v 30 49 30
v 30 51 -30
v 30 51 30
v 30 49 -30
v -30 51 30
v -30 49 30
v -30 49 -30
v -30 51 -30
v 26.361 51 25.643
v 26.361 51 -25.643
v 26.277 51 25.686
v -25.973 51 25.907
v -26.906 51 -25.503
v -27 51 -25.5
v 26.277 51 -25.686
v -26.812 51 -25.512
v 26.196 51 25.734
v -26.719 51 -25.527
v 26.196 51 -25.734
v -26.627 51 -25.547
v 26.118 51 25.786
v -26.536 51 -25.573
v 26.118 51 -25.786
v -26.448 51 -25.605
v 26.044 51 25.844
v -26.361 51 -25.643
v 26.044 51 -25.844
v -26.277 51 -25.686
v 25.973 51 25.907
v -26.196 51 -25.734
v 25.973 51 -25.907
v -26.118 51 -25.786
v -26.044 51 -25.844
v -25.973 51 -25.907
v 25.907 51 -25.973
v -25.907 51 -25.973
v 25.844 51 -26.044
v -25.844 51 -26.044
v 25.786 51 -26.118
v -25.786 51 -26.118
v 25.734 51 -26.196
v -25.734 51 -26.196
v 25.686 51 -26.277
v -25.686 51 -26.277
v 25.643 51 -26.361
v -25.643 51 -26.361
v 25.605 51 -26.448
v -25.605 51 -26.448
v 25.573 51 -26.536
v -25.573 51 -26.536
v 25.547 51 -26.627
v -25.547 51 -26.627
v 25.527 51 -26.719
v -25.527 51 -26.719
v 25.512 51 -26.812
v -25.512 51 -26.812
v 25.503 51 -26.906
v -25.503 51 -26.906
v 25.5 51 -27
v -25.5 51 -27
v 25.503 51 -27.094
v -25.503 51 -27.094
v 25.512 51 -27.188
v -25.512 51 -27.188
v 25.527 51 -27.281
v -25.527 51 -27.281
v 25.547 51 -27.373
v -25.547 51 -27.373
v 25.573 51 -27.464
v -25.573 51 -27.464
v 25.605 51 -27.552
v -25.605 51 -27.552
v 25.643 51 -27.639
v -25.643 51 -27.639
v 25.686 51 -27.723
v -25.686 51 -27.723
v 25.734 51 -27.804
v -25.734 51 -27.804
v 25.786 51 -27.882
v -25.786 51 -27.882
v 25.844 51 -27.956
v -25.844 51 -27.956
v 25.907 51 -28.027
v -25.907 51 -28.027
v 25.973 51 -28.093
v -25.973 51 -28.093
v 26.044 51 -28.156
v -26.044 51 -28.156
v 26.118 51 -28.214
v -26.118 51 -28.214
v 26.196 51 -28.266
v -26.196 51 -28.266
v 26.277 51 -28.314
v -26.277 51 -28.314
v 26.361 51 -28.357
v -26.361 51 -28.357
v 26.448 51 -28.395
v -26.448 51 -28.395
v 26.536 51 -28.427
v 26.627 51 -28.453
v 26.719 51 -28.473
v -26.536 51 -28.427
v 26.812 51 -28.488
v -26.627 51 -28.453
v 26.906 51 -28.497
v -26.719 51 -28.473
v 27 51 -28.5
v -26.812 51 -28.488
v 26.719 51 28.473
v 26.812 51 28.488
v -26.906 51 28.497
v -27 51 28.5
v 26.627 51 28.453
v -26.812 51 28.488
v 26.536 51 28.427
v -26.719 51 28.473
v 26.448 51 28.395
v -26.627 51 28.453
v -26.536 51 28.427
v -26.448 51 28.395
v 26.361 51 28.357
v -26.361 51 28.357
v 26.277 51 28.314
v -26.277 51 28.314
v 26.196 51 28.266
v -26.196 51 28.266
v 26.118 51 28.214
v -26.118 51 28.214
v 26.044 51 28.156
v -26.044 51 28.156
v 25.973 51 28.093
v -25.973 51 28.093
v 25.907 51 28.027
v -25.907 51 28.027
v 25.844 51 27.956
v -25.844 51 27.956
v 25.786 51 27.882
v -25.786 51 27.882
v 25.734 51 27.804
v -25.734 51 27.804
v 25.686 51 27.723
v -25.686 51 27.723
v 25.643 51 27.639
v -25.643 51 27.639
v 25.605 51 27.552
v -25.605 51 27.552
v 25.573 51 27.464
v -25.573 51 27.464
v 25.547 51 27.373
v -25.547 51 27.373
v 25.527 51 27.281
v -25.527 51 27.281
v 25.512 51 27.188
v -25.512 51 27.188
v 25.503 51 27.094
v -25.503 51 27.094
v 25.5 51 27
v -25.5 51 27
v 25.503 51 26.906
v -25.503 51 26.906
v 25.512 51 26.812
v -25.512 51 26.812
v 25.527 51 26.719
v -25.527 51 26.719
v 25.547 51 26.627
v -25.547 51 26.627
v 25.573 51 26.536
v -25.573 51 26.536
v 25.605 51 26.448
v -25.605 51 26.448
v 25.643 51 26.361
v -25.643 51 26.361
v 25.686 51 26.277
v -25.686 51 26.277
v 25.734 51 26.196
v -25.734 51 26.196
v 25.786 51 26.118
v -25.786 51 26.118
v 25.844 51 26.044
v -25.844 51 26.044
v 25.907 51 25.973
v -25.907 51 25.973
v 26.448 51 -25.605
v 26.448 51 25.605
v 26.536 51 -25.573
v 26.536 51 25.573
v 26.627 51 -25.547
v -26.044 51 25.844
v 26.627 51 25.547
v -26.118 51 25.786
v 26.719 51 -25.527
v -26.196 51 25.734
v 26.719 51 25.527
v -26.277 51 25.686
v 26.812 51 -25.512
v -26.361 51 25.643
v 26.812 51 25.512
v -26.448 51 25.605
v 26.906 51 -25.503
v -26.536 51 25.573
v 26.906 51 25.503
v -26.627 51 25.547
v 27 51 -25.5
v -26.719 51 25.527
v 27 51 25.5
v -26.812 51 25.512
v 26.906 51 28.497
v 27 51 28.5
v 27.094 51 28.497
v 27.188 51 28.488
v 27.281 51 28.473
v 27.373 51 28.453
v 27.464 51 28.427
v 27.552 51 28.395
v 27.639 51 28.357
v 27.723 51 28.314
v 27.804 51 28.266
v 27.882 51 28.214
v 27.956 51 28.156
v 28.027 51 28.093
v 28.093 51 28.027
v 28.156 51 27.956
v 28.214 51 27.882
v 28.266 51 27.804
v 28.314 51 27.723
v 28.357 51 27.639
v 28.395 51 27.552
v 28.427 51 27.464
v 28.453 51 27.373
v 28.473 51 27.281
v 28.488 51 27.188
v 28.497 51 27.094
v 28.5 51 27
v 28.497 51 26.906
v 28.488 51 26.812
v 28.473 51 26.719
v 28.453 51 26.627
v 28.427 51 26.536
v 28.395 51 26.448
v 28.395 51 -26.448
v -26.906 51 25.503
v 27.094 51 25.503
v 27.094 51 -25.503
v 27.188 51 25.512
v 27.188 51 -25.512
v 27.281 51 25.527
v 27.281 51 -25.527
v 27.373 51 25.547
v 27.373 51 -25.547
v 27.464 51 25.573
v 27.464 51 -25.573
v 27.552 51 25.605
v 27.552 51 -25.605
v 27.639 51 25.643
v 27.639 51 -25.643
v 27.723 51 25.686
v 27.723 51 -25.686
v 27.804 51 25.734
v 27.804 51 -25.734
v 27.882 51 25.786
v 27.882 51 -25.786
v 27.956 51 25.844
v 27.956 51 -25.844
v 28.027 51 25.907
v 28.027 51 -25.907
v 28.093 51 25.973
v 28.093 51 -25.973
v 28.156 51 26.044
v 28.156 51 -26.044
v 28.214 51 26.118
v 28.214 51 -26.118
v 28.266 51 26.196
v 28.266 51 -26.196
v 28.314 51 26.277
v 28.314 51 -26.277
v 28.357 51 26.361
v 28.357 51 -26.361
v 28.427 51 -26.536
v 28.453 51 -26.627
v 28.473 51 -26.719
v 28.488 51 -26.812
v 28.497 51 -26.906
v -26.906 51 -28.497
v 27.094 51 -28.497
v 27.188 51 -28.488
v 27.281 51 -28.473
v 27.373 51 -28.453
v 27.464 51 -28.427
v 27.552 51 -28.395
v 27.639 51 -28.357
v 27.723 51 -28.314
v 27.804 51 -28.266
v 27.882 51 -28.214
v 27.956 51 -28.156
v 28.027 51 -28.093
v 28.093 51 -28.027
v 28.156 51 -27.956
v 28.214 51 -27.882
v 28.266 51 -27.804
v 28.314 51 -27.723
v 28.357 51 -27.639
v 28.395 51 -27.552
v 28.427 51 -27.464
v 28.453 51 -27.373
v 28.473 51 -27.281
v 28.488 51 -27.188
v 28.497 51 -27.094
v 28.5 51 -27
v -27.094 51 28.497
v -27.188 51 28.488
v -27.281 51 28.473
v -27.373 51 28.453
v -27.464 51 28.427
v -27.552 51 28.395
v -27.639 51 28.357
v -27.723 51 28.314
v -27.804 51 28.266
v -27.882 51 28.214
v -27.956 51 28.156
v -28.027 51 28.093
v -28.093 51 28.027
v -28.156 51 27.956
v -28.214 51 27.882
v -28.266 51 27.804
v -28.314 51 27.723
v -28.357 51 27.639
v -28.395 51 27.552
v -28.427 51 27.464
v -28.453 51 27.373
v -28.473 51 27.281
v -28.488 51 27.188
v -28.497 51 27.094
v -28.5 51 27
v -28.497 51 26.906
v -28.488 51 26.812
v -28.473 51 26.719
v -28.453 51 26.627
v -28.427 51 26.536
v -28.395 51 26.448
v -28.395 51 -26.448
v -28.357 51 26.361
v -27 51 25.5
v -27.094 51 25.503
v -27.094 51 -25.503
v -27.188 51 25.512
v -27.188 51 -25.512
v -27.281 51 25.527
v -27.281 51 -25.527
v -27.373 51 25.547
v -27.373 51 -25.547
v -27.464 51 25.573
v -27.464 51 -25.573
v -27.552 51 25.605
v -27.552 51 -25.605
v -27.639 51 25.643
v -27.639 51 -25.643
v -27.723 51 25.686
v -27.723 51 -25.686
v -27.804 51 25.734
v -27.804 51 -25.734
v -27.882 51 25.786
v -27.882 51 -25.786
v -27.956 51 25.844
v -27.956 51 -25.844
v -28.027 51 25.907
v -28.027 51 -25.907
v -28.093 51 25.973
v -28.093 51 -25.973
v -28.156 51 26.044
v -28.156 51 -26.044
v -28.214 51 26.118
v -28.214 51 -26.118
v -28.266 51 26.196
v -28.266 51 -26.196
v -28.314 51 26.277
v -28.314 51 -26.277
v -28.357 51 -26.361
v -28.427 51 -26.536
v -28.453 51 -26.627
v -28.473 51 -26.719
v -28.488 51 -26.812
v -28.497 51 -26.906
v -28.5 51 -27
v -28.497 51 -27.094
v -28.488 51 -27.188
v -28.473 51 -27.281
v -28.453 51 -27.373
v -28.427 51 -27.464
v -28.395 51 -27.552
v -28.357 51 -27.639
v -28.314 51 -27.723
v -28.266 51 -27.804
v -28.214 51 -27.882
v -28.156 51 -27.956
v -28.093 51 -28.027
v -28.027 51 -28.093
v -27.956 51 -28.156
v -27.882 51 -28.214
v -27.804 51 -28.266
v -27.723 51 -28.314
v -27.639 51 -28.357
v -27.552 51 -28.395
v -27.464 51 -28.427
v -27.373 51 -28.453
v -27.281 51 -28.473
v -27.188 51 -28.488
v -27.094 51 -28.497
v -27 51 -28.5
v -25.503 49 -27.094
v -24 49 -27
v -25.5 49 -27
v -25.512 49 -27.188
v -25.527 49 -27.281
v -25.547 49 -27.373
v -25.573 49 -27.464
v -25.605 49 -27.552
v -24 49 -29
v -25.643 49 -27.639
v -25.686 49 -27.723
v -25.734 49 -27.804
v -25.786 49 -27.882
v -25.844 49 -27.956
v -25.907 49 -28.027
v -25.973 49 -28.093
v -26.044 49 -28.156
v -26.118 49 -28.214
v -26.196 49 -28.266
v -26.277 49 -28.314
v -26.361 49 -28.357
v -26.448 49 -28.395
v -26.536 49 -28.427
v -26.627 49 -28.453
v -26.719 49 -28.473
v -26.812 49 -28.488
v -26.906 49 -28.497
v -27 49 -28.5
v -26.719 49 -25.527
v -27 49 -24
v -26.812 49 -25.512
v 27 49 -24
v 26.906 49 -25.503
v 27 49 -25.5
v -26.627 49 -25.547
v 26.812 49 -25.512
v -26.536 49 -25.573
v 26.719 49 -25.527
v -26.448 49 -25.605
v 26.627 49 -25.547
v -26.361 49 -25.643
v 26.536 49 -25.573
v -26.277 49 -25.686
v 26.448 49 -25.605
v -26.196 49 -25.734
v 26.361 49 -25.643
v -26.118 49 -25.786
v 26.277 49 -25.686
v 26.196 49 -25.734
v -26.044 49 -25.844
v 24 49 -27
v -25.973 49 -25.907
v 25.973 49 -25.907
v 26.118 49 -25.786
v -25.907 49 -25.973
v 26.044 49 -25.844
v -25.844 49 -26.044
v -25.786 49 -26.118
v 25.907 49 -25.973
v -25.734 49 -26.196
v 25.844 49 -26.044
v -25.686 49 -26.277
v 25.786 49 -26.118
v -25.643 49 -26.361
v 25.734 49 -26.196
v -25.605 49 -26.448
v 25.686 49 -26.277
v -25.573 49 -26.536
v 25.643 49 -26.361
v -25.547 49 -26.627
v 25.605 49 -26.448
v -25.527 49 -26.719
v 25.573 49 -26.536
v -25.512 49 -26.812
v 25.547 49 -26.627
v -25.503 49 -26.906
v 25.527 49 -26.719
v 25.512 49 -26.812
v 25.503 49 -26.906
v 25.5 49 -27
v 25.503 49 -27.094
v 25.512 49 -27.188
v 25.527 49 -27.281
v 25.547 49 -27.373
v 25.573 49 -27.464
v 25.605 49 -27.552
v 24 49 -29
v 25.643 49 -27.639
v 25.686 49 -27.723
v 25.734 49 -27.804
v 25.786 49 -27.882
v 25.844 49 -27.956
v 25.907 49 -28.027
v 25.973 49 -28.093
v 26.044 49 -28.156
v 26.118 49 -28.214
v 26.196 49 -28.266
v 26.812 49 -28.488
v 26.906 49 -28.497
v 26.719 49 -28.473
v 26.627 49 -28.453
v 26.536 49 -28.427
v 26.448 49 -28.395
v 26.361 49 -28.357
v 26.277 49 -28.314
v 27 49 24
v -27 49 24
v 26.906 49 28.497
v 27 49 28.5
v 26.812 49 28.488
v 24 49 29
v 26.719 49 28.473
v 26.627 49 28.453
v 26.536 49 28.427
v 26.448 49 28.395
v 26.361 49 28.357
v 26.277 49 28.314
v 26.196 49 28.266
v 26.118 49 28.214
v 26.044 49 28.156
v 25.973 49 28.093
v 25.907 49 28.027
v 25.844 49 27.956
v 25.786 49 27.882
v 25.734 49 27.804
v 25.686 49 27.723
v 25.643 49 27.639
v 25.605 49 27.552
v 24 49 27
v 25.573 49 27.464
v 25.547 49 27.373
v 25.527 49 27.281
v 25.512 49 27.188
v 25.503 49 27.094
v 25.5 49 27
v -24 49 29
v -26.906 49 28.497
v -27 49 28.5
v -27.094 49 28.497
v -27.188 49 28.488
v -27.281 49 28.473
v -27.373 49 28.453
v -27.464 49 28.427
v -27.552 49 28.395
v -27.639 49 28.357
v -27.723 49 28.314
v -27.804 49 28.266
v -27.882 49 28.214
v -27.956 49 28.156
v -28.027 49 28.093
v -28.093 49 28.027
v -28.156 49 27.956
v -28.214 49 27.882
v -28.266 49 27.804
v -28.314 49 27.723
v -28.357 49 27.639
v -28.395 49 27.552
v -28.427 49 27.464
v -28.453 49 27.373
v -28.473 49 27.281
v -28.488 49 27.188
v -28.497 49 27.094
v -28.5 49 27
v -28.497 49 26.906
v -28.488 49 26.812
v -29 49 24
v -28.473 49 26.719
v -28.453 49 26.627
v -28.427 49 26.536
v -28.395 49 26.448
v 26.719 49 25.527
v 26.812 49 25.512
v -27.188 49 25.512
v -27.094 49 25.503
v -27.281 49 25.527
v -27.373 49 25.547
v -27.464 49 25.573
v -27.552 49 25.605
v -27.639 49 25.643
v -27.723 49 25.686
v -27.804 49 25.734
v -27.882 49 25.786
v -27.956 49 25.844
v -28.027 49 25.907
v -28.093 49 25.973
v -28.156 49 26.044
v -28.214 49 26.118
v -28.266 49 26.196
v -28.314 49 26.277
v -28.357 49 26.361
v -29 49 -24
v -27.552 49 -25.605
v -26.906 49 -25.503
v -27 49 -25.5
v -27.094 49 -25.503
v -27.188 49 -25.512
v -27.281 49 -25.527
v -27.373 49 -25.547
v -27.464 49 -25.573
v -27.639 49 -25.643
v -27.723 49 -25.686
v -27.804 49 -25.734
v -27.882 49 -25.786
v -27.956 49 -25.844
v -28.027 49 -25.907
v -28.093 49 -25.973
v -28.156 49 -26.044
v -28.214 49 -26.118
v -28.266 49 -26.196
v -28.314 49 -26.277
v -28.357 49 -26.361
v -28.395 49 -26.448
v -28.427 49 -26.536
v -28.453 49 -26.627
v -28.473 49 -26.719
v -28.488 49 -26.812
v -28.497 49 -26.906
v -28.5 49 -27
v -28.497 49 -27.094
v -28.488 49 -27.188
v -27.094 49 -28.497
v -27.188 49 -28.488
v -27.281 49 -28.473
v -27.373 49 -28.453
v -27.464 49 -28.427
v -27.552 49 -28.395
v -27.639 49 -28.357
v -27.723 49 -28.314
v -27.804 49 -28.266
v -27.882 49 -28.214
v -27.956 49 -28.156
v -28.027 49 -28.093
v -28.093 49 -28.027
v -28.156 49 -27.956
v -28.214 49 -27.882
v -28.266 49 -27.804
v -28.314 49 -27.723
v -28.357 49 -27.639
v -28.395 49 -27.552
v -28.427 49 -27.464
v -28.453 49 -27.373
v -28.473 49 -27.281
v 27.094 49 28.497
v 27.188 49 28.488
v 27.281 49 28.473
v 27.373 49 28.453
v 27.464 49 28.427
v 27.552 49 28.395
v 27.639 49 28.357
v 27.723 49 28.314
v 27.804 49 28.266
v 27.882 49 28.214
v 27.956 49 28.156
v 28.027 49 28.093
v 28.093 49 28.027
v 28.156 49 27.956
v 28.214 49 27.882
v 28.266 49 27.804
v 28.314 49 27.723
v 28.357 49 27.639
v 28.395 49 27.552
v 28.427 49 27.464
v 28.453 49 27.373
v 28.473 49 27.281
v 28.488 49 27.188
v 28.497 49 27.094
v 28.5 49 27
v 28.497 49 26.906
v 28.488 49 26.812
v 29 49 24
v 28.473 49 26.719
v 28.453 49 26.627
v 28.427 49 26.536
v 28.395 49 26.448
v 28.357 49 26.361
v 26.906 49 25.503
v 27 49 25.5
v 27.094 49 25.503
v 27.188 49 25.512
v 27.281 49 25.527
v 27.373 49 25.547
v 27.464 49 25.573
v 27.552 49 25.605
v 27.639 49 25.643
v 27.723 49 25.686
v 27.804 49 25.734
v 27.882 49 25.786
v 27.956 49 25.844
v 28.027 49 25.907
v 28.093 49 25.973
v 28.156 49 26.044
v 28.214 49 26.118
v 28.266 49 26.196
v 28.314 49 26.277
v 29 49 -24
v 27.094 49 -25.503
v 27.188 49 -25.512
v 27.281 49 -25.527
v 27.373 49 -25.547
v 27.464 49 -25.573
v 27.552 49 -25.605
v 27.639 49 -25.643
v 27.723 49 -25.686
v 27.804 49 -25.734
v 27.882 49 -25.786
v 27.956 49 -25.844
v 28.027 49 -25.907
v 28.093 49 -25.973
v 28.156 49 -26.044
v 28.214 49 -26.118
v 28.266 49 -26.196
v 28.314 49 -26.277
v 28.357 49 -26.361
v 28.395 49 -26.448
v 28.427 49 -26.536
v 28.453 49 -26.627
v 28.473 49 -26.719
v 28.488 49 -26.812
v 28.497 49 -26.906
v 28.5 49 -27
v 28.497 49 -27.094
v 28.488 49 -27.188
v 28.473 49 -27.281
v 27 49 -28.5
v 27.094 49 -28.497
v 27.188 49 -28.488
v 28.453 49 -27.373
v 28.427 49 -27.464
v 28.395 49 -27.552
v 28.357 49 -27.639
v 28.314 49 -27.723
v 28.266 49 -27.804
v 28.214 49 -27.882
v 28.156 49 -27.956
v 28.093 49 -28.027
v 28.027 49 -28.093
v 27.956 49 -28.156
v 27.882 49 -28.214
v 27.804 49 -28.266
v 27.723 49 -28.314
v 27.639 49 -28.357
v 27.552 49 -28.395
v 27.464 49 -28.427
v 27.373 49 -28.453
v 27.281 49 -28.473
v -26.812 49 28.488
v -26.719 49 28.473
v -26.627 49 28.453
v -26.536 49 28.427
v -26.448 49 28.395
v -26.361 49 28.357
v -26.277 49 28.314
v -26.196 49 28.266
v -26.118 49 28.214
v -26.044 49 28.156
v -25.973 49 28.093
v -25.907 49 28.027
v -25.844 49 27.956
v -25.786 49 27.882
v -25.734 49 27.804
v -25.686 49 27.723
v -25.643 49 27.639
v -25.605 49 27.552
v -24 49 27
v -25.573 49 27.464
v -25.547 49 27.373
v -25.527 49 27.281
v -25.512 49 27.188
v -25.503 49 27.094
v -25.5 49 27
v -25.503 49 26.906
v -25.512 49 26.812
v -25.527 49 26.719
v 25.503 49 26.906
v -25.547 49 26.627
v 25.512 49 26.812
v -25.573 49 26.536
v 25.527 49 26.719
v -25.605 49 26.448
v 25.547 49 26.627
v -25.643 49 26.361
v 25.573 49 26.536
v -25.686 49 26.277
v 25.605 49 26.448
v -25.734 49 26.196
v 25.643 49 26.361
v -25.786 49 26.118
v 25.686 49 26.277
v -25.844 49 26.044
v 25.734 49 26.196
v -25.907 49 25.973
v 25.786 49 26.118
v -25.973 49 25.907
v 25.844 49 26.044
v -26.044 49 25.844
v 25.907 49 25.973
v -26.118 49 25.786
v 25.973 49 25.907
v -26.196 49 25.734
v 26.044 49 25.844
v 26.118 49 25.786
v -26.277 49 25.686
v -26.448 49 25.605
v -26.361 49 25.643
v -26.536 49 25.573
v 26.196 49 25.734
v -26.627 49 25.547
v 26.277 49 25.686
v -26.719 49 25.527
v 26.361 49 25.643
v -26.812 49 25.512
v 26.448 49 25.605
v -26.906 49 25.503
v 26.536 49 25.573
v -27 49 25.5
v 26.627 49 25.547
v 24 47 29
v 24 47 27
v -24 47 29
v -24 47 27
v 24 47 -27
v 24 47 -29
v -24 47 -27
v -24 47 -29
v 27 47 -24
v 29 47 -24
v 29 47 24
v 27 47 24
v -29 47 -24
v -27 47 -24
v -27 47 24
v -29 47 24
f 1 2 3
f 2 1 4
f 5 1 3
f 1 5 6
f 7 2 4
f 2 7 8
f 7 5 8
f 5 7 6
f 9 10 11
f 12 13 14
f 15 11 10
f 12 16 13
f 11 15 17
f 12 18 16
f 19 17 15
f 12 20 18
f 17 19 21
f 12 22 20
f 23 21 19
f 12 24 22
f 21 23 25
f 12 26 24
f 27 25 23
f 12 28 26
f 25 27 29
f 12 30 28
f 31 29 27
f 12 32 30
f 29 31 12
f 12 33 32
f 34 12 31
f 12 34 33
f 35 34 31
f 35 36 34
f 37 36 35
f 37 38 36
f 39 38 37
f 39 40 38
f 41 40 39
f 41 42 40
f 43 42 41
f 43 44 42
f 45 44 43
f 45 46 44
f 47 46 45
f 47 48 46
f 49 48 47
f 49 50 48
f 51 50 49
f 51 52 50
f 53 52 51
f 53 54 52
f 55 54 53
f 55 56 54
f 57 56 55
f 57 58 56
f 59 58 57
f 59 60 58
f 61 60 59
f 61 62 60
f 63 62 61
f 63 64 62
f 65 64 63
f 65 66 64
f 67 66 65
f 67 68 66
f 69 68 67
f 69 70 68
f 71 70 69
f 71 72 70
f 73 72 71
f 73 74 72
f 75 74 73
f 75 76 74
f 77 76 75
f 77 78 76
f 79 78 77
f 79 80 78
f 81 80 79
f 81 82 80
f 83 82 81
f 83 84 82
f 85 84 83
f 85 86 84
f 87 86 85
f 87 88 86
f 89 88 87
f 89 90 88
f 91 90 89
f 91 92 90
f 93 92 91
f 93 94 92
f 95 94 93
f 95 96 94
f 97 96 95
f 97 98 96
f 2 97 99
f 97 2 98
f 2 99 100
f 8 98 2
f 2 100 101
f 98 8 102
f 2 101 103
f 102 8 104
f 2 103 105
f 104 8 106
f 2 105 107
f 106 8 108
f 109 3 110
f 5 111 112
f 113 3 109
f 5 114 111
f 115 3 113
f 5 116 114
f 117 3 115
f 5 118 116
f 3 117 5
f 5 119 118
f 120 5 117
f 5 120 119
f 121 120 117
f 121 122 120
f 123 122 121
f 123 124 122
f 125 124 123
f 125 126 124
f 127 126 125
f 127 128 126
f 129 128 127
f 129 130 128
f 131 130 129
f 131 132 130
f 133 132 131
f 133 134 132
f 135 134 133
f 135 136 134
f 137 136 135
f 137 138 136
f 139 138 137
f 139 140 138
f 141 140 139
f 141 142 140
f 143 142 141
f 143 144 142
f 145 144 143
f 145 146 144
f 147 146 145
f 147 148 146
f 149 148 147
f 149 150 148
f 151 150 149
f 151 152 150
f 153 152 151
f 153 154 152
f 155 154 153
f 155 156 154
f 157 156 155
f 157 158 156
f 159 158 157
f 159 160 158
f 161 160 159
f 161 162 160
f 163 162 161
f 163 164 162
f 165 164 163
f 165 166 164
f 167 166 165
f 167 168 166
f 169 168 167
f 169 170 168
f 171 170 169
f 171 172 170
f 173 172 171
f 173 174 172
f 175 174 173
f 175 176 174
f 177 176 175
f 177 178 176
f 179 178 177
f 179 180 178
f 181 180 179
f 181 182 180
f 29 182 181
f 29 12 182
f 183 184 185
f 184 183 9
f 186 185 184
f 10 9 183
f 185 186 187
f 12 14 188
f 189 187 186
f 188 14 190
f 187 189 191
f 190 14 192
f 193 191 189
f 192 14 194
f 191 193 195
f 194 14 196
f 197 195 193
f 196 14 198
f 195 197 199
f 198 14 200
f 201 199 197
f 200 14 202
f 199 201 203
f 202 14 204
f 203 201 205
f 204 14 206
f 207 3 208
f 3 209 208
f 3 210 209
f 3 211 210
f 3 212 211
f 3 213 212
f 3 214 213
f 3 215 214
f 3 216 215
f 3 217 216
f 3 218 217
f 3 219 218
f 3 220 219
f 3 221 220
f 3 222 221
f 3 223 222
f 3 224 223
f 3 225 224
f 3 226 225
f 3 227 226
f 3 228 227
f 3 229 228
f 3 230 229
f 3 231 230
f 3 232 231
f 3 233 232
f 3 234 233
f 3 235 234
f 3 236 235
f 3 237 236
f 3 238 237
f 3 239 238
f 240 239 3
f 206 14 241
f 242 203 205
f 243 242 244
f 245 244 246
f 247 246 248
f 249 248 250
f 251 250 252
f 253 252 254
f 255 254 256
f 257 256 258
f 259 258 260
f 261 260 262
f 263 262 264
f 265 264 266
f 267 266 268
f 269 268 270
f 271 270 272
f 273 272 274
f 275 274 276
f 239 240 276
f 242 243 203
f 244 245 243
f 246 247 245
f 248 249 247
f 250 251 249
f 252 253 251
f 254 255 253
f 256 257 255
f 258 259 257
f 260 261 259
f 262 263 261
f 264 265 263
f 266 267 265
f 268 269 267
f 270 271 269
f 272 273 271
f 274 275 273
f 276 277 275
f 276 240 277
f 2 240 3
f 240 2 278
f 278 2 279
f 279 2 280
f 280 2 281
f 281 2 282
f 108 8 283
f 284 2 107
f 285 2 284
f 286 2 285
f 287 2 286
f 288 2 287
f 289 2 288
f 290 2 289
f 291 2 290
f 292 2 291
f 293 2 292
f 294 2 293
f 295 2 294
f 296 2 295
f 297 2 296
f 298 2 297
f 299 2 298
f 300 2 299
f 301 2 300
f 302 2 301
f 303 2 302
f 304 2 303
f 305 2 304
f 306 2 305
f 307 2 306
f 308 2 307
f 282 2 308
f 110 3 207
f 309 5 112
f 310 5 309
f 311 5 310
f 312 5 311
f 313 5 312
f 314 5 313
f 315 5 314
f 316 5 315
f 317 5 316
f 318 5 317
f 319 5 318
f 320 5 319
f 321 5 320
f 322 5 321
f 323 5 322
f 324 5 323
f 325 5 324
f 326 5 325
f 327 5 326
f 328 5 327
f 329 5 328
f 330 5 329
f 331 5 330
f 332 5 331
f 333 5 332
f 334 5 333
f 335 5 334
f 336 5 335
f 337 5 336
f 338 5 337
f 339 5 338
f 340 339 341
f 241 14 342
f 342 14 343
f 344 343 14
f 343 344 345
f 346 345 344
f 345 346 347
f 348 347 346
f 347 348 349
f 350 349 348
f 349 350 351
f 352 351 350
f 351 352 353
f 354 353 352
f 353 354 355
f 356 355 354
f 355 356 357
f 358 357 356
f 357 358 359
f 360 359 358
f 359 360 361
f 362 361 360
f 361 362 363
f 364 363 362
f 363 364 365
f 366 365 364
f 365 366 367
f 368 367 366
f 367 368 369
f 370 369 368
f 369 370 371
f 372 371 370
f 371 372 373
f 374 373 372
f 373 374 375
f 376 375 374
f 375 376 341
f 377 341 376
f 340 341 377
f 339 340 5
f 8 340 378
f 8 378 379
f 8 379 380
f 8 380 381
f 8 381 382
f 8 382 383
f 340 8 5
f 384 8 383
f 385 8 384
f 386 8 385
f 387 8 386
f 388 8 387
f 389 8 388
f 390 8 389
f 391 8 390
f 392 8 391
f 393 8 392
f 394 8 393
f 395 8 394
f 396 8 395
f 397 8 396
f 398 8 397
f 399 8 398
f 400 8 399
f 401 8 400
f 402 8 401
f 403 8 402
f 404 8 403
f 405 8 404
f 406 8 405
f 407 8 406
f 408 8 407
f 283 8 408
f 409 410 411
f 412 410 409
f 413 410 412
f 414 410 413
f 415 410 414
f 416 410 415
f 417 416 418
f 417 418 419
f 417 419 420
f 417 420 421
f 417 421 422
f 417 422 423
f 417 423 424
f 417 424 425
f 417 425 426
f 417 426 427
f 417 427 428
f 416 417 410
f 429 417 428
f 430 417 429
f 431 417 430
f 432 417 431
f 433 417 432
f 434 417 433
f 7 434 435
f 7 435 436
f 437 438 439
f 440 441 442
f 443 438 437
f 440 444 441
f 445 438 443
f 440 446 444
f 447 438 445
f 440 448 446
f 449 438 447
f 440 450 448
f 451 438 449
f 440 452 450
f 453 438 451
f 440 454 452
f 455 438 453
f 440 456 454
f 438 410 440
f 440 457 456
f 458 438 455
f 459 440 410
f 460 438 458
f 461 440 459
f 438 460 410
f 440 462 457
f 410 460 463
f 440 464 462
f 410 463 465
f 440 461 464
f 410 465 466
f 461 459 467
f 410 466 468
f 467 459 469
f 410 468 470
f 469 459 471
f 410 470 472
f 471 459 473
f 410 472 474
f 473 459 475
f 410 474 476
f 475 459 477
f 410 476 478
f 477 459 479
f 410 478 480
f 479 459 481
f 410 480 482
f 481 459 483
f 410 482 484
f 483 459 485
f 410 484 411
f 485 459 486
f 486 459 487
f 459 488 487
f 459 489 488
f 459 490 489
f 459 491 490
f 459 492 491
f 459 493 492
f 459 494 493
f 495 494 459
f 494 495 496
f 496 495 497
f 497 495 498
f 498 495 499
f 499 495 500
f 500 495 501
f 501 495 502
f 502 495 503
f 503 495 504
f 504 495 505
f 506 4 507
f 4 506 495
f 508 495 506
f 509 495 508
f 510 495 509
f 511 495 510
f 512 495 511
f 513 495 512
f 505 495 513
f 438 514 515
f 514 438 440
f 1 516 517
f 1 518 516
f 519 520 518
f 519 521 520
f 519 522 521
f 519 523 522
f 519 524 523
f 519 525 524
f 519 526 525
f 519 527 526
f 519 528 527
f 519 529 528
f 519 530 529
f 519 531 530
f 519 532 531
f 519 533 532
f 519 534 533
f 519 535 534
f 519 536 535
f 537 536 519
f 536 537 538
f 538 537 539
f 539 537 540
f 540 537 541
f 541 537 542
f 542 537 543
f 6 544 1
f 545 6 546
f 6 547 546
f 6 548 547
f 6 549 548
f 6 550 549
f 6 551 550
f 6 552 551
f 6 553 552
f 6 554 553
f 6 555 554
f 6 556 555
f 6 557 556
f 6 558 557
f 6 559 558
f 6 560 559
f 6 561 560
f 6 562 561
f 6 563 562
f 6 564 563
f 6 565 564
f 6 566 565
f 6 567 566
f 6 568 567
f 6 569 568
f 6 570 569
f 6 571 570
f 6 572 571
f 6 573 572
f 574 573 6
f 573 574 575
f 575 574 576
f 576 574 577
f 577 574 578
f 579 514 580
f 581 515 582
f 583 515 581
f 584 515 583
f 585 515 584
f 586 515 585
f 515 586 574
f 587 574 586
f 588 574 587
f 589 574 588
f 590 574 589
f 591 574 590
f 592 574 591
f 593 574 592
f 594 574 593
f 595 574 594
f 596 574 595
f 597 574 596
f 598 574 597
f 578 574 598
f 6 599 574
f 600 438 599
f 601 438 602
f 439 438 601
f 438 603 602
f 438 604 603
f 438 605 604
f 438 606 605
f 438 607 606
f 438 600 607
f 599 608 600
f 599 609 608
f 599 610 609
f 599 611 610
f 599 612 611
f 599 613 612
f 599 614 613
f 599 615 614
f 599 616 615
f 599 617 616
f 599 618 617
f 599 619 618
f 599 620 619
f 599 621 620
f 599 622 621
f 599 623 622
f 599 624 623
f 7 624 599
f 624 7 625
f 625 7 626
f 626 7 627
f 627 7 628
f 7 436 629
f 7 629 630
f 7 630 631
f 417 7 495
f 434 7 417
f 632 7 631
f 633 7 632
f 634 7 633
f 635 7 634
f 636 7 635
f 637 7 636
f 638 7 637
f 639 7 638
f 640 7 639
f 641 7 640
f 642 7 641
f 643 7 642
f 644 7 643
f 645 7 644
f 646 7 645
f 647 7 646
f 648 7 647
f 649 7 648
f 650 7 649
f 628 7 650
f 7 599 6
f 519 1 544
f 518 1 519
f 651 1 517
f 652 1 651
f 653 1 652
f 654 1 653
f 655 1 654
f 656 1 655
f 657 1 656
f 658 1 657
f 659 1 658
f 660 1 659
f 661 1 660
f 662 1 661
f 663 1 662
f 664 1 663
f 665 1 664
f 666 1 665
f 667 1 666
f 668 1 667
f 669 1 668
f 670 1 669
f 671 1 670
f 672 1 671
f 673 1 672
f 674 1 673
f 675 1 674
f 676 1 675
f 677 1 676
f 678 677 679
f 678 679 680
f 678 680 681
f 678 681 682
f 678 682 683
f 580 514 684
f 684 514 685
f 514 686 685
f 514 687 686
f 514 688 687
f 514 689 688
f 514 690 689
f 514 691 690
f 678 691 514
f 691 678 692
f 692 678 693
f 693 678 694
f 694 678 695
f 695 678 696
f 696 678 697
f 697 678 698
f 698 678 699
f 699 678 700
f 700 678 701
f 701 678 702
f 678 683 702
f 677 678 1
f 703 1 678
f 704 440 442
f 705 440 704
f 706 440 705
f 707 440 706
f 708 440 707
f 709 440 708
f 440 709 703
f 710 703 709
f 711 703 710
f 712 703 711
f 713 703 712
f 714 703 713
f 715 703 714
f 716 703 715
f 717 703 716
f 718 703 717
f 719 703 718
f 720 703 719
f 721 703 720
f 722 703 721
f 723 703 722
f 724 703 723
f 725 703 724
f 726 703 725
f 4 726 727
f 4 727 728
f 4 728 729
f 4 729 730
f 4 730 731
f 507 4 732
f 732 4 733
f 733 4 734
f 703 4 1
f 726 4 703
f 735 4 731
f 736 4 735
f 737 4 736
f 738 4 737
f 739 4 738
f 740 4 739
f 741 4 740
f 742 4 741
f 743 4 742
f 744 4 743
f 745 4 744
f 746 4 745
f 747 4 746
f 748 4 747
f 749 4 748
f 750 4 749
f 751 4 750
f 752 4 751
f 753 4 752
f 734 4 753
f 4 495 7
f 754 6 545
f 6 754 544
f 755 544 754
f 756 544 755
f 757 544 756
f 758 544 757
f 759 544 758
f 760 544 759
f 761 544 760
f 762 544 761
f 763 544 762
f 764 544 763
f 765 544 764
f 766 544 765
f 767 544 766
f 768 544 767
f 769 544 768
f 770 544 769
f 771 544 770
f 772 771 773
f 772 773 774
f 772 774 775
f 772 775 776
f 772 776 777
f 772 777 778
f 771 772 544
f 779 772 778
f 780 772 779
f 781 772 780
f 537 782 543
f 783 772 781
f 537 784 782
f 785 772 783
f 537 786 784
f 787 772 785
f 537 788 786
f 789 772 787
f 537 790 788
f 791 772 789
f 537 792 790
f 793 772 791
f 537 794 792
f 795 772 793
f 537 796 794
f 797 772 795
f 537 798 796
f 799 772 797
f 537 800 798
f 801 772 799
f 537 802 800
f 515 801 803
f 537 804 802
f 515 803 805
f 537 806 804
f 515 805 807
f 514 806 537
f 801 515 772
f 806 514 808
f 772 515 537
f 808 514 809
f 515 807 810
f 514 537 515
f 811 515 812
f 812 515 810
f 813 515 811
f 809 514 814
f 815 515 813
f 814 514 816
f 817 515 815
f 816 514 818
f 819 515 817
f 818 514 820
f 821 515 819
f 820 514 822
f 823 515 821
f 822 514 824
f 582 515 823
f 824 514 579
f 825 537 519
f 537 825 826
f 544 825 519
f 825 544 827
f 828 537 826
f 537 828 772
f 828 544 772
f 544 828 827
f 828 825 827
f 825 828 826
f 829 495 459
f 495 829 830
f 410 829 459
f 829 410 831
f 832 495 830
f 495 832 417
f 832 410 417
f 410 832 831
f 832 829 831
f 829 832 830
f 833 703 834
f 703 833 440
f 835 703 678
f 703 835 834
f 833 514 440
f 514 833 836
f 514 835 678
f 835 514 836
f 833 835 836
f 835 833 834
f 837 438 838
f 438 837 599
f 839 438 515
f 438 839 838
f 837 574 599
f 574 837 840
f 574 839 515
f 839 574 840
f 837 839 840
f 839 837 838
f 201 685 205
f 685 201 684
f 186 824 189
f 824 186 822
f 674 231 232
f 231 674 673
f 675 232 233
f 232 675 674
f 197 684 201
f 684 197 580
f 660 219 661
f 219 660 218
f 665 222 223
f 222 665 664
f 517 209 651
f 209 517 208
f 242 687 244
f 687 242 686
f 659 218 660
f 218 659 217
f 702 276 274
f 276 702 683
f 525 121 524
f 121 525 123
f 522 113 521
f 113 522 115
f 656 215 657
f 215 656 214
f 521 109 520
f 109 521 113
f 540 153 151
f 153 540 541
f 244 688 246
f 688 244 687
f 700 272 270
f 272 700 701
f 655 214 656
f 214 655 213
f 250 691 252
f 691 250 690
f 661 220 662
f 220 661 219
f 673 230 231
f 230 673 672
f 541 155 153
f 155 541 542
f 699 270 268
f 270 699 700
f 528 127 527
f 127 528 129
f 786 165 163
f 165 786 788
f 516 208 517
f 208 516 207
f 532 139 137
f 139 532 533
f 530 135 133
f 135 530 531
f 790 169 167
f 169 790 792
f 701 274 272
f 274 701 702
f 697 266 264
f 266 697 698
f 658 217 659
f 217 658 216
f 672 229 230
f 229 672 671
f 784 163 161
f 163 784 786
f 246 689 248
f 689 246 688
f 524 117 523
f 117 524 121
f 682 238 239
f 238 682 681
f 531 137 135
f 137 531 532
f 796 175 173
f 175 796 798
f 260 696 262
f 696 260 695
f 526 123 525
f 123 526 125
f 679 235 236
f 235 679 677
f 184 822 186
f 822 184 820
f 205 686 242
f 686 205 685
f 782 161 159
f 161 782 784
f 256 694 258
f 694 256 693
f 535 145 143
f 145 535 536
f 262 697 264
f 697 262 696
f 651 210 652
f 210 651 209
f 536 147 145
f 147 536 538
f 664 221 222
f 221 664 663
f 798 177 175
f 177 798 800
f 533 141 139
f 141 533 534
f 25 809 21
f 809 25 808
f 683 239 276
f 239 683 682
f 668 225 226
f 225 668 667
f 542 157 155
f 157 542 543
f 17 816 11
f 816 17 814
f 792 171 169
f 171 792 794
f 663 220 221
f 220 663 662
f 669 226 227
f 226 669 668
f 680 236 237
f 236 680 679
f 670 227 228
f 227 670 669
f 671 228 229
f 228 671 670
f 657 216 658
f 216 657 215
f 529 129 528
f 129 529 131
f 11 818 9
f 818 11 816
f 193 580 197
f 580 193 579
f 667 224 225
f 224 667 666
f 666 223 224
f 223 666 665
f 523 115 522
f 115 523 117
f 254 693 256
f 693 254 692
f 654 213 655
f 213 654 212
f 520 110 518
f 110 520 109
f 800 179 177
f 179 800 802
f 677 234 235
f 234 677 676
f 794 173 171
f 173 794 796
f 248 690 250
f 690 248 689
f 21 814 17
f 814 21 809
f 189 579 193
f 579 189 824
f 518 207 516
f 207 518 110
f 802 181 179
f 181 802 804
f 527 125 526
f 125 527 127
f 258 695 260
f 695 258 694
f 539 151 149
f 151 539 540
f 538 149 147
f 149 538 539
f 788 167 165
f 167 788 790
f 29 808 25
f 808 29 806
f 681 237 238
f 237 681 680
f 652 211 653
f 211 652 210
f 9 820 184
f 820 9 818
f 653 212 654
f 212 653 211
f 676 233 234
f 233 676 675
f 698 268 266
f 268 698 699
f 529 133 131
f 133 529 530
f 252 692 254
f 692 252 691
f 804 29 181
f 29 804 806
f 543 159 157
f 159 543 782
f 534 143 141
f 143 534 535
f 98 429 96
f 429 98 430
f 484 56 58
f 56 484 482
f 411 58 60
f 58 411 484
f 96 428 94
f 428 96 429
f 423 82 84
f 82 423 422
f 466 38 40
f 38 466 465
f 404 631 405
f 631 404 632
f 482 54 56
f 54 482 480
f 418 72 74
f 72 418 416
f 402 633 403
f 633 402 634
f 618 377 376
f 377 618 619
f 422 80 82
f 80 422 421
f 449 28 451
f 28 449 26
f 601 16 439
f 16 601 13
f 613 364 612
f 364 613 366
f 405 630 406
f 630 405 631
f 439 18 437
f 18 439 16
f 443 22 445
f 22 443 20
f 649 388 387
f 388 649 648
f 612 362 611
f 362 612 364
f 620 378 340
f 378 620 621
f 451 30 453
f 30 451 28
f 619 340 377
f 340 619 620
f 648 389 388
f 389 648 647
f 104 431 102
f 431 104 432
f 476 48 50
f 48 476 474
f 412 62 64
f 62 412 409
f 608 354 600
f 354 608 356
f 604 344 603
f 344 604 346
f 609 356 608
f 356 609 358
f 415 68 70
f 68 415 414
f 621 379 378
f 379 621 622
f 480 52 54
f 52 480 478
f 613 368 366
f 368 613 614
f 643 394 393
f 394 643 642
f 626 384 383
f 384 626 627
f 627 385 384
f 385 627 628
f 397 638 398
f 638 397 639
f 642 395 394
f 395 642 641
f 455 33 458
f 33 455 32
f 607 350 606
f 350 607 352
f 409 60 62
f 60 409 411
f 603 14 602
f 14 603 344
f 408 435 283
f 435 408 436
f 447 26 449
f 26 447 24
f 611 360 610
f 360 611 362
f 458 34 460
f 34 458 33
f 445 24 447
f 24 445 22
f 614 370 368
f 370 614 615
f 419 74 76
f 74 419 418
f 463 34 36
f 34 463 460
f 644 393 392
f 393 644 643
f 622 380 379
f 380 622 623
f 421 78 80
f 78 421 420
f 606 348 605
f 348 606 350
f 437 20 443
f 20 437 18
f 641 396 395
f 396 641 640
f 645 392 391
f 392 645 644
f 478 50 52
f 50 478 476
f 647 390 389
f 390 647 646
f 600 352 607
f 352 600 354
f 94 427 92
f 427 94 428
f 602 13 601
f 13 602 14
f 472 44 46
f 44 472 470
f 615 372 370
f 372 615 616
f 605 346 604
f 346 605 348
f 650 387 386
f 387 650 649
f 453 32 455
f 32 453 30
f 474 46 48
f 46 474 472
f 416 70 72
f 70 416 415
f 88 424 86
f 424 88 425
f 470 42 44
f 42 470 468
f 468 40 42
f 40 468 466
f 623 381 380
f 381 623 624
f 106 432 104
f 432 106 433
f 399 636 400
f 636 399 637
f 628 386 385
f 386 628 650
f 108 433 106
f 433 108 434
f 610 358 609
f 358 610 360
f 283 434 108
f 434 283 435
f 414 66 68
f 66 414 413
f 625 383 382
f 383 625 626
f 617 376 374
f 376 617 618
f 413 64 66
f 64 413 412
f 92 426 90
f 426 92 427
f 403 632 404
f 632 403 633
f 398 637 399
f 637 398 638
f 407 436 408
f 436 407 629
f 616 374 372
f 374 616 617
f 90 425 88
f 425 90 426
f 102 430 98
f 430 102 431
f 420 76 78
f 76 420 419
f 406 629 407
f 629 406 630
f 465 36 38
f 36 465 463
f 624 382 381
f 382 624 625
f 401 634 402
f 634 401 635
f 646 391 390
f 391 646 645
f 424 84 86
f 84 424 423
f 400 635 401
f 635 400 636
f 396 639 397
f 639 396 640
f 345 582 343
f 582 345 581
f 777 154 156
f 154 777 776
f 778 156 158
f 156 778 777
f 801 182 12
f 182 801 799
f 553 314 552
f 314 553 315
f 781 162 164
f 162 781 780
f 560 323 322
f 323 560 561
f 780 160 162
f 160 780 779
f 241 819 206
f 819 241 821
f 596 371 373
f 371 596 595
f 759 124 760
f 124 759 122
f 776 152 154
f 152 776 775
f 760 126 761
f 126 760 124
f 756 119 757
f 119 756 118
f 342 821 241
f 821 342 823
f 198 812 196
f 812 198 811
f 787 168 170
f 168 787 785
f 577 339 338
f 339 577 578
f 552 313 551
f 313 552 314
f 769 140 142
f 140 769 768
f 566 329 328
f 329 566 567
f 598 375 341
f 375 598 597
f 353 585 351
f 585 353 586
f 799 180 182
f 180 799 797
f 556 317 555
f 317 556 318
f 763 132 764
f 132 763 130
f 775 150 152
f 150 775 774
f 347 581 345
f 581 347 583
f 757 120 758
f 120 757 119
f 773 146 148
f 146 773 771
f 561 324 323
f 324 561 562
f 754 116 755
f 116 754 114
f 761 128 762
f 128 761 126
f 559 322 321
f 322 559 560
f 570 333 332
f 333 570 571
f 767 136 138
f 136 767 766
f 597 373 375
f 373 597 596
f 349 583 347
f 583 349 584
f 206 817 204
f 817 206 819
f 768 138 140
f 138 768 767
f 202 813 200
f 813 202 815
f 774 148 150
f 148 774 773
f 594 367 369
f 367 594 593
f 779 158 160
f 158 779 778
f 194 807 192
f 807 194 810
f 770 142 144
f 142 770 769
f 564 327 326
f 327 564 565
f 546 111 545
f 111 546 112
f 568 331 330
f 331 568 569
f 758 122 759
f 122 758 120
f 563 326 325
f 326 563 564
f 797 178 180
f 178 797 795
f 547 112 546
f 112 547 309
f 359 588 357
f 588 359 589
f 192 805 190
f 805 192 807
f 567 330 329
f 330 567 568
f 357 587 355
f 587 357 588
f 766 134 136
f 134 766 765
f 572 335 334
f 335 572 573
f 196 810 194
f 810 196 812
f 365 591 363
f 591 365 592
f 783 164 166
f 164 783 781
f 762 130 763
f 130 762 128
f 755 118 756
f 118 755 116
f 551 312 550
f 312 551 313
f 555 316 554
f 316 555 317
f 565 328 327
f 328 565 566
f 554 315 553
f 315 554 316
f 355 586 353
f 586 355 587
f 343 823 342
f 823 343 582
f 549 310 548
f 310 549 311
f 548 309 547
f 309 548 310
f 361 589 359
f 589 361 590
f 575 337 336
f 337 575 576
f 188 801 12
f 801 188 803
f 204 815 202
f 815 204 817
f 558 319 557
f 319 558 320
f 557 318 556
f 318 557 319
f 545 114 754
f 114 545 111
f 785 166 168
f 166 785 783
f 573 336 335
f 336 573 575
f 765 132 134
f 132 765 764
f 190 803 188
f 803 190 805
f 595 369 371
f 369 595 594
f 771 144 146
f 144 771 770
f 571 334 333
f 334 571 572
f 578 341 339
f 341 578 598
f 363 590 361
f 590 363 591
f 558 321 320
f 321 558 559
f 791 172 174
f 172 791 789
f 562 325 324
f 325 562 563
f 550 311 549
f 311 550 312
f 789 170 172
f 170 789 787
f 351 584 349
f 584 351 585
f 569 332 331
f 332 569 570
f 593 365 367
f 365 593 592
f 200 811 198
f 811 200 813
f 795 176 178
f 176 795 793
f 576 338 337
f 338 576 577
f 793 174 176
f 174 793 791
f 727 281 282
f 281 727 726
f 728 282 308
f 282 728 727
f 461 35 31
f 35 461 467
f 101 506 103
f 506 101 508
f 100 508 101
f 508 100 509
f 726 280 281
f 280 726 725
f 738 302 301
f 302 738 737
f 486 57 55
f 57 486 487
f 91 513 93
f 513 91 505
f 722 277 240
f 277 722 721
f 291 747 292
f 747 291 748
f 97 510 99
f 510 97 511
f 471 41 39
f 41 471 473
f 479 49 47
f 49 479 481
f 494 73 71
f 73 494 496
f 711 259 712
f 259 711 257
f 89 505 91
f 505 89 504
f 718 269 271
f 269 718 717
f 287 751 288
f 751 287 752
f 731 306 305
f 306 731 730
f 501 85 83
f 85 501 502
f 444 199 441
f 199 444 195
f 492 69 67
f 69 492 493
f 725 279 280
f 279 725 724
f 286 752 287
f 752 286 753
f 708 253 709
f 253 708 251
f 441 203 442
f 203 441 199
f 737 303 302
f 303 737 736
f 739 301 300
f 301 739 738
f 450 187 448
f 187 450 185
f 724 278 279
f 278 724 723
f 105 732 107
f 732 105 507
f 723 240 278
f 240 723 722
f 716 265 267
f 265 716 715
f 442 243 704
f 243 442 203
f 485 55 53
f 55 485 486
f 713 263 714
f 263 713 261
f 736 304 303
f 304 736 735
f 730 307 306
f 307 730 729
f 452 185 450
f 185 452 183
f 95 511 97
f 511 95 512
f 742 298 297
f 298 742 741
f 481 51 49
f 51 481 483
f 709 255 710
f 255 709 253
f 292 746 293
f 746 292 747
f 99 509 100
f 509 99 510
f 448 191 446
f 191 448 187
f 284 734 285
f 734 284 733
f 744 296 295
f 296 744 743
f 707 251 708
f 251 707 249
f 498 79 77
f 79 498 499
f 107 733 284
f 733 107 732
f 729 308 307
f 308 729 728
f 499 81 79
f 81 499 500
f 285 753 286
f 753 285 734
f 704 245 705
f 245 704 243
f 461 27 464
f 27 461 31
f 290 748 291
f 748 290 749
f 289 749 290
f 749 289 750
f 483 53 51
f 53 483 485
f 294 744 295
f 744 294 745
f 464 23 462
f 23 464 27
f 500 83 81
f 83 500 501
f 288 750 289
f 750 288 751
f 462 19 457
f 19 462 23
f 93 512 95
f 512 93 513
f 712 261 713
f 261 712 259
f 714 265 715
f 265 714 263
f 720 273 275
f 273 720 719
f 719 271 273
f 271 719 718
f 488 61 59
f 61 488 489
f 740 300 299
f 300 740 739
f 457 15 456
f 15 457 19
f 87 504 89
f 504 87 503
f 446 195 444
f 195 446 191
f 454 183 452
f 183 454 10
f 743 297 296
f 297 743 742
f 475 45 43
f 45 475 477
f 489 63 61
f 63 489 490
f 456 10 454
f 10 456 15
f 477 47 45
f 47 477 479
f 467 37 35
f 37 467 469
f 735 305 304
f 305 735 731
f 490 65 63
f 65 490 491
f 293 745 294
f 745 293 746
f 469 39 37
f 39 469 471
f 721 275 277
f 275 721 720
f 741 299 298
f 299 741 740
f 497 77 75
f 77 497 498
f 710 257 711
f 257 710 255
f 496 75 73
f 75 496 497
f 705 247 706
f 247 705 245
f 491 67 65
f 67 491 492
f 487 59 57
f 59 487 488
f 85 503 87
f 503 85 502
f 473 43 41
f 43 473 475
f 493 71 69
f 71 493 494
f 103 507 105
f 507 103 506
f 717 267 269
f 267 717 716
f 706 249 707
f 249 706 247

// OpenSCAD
$fn=100;

case=false;
back=true;


width=60;
height=60;
depth=50;

wall=2;

// display
display_width=34;
display_height=20;
display_x=5;
display_y=-30;
display_z=-12;

// sensor
sensor_width=33;
sensor_height=22;
sensor_x=0;
sensor_y=-30;
sensor_z=12;

// usb connector
usb_width=10;
usb_height=12;
usb_x=-33;
usb_y=-21;
usb_z=-10;

// LED
led_diameter=5;
led_x=0;
led_y=0;
led_z=height/2-wall/2;

if (case) {
  difference() {
    union() {
      difference() { // case
        cube([width,depth,height], center=true);  // body
        translate ([0,wall/2,0]) cube([width-wall,depth,height-wall], center=true); // inner space
        translate([display_x,display_y+wall,display_z]) cube([display_width, 10, display_height], center=true); // display
        translate([sensor_x,sensor_y+wall,sensor_z]) cube([sensor_width, 10, sensor_height], center=true); // sensor
        translate([usb_x,usb_y,usb_z]) rotate([90,0,0]) cube([usb_width, usb_height, 10], center=true); // usb connector
        translate([led_x,led_y,led_z]) cylinder(d=led_diameter, h=wall*2, center=true); // led
      }
      translate([(width/2-wall*1.5), 0, (height/2-wall*1.5)], center=true) corner();
      translate([-(width/2-wall*1.5), 0, -(height/2-wall*1.5)], center=true) corner();
      translate([-(width/2-wall*1.5), 0, height/2-wall*1.5], center=true) corner();
      translate([width/2-wall*1.5, 0, -(height/2-wall*1.5)], center=true) corner();
    }
    //translate([0,30,0]) cube([100,100,100], center=true); // block for print debugging
  }
}

module corner() { // corner blocks for screws
  width=4;
  hole=2;
  difference() {
    translate([0,0,0]) cube([width, depth, width], center=true);
    translate([0,1,0]) rotate([90,0,0]) cylinder(d=hole, h=depth, center=true);
  }
}

if (back) {
  difference() {
    hole=3;
    translate([0,depth,0]) union() {
      cube([width,wall,height], center=true); // back plate
      translate([0,-wall,height/2-wall]) cube([width-12,wall,wall], center=true); // top
      translate([0,-wall,-(height/2-wall)]) cube([width-12,wall,wall], center=true); // bottom
      translate([width/2-wall,-wall,0]) rotate ([0,90,0]) cube([width-12,wall,wall], center=true); // left
      translate([-(width/2-wall),-wall,0]) rotate ([0,90,0])  cube([width-12,wall,wall], center=true); // right   
    };
    translate([width/2-wall*1.5,depth,height/2-wall*1.5]) rotate ([90,0,0]) cylinder(d=hole,h=10, center=true);
    translate([-(width/2-wall*1.5),depth,-(height/2-wall*1.5)]) rotate ([90,0,0]) cylinder(d=hole,h=10, center=true);
    translate([-(width/2-wall*1.5),depth,height/2-wall*1.5]) rotate ([90,0,0]) cylinder(d=hole,h=10, center=true);
    translate([width/2-wall*1.5,depth,-(height/2-wall*1.5)]) rotate ([90,0,0]) cylinder(d=hole,h=10, center=true);
  };
}
